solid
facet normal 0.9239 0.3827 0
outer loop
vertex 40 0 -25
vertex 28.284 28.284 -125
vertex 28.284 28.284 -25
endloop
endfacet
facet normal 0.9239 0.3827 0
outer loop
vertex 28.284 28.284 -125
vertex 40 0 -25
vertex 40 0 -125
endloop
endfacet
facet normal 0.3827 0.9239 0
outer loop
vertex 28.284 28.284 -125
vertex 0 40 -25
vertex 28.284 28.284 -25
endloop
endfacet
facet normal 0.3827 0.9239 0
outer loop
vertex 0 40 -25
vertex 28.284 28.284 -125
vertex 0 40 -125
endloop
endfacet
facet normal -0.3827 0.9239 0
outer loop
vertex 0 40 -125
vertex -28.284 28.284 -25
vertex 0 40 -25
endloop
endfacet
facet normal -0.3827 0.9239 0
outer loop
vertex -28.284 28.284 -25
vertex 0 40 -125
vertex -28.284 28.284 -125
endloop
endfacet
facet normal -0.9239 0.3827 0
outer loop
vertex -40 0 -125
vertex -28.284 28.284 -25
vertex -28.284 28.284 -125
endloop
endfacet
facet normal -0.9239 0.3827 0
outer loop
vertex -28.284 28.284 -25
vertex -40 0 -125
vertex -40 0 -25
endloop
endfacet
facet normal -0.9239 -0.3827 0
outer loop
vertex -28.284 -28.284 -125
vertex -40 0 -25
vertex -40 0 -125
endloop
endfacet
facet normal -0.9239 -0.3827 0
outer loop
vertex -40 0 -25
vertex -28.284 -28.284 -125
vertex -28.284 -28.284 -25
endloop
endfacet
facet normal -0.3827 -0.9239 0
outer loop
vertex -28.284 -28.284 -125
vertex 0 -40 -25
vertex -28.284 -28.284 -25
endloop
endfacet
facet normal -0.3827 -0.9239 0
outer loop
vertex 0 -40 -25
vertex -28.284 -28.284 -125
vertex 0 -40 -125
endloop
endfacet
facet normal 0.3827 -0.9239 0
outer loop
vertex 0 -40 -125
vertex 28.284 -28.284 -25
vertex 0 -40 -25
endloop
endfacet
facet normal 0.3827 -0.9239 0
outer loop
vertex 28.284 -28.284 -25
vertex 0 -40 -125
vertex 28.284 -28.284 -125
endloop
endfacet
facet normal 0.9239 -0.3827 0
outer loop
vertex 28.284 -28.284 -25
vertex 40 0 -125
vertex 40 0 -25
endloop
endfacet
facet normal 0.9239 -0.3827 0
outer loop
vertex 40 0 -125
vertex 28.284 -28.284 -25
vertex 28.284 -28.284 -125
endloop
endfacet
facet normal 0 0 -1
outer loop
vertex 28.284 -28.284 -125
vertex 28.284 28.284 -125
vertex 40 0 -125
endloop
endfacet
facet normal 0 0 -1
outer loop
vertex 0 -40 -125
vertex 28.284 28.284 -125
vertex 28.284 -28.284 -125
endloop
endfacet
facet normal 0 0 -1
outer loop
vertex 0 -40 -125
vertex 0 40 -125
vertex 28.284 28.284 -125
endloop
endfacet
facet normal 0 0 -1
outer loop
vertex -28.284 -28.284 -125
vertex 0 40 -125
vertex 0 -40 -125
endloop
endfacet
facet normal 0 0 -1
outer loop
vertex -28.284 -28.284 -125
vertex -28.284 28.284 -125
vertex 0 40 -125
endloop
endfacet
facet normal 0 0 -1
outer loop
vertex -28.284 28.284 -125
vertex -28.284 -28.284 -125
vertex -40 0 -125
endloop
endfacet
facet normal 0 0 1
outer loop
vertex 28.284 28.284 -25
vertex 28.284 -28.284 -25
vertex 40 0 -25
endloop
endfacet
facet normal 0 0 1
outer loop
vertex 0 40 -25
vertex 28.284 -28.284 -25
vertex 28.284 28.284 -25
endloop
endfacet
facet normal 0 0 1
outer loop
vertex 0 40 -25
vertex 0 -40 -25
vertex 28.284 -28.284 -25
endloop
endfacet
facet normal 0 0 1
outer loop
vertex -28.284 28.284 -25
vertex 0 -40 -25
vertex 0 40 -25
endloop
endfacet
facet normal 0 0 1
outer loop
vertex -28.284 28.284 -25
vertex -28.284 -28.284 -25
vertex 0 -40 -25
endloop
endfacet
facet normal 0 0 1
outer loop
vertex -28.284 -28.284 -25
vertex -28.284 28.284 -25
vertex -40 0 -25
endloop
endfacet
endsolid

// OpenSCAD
color("white")
	translate([0,0,-75])
		cylinder(r=40, h=100, center=true, $fn=8);
